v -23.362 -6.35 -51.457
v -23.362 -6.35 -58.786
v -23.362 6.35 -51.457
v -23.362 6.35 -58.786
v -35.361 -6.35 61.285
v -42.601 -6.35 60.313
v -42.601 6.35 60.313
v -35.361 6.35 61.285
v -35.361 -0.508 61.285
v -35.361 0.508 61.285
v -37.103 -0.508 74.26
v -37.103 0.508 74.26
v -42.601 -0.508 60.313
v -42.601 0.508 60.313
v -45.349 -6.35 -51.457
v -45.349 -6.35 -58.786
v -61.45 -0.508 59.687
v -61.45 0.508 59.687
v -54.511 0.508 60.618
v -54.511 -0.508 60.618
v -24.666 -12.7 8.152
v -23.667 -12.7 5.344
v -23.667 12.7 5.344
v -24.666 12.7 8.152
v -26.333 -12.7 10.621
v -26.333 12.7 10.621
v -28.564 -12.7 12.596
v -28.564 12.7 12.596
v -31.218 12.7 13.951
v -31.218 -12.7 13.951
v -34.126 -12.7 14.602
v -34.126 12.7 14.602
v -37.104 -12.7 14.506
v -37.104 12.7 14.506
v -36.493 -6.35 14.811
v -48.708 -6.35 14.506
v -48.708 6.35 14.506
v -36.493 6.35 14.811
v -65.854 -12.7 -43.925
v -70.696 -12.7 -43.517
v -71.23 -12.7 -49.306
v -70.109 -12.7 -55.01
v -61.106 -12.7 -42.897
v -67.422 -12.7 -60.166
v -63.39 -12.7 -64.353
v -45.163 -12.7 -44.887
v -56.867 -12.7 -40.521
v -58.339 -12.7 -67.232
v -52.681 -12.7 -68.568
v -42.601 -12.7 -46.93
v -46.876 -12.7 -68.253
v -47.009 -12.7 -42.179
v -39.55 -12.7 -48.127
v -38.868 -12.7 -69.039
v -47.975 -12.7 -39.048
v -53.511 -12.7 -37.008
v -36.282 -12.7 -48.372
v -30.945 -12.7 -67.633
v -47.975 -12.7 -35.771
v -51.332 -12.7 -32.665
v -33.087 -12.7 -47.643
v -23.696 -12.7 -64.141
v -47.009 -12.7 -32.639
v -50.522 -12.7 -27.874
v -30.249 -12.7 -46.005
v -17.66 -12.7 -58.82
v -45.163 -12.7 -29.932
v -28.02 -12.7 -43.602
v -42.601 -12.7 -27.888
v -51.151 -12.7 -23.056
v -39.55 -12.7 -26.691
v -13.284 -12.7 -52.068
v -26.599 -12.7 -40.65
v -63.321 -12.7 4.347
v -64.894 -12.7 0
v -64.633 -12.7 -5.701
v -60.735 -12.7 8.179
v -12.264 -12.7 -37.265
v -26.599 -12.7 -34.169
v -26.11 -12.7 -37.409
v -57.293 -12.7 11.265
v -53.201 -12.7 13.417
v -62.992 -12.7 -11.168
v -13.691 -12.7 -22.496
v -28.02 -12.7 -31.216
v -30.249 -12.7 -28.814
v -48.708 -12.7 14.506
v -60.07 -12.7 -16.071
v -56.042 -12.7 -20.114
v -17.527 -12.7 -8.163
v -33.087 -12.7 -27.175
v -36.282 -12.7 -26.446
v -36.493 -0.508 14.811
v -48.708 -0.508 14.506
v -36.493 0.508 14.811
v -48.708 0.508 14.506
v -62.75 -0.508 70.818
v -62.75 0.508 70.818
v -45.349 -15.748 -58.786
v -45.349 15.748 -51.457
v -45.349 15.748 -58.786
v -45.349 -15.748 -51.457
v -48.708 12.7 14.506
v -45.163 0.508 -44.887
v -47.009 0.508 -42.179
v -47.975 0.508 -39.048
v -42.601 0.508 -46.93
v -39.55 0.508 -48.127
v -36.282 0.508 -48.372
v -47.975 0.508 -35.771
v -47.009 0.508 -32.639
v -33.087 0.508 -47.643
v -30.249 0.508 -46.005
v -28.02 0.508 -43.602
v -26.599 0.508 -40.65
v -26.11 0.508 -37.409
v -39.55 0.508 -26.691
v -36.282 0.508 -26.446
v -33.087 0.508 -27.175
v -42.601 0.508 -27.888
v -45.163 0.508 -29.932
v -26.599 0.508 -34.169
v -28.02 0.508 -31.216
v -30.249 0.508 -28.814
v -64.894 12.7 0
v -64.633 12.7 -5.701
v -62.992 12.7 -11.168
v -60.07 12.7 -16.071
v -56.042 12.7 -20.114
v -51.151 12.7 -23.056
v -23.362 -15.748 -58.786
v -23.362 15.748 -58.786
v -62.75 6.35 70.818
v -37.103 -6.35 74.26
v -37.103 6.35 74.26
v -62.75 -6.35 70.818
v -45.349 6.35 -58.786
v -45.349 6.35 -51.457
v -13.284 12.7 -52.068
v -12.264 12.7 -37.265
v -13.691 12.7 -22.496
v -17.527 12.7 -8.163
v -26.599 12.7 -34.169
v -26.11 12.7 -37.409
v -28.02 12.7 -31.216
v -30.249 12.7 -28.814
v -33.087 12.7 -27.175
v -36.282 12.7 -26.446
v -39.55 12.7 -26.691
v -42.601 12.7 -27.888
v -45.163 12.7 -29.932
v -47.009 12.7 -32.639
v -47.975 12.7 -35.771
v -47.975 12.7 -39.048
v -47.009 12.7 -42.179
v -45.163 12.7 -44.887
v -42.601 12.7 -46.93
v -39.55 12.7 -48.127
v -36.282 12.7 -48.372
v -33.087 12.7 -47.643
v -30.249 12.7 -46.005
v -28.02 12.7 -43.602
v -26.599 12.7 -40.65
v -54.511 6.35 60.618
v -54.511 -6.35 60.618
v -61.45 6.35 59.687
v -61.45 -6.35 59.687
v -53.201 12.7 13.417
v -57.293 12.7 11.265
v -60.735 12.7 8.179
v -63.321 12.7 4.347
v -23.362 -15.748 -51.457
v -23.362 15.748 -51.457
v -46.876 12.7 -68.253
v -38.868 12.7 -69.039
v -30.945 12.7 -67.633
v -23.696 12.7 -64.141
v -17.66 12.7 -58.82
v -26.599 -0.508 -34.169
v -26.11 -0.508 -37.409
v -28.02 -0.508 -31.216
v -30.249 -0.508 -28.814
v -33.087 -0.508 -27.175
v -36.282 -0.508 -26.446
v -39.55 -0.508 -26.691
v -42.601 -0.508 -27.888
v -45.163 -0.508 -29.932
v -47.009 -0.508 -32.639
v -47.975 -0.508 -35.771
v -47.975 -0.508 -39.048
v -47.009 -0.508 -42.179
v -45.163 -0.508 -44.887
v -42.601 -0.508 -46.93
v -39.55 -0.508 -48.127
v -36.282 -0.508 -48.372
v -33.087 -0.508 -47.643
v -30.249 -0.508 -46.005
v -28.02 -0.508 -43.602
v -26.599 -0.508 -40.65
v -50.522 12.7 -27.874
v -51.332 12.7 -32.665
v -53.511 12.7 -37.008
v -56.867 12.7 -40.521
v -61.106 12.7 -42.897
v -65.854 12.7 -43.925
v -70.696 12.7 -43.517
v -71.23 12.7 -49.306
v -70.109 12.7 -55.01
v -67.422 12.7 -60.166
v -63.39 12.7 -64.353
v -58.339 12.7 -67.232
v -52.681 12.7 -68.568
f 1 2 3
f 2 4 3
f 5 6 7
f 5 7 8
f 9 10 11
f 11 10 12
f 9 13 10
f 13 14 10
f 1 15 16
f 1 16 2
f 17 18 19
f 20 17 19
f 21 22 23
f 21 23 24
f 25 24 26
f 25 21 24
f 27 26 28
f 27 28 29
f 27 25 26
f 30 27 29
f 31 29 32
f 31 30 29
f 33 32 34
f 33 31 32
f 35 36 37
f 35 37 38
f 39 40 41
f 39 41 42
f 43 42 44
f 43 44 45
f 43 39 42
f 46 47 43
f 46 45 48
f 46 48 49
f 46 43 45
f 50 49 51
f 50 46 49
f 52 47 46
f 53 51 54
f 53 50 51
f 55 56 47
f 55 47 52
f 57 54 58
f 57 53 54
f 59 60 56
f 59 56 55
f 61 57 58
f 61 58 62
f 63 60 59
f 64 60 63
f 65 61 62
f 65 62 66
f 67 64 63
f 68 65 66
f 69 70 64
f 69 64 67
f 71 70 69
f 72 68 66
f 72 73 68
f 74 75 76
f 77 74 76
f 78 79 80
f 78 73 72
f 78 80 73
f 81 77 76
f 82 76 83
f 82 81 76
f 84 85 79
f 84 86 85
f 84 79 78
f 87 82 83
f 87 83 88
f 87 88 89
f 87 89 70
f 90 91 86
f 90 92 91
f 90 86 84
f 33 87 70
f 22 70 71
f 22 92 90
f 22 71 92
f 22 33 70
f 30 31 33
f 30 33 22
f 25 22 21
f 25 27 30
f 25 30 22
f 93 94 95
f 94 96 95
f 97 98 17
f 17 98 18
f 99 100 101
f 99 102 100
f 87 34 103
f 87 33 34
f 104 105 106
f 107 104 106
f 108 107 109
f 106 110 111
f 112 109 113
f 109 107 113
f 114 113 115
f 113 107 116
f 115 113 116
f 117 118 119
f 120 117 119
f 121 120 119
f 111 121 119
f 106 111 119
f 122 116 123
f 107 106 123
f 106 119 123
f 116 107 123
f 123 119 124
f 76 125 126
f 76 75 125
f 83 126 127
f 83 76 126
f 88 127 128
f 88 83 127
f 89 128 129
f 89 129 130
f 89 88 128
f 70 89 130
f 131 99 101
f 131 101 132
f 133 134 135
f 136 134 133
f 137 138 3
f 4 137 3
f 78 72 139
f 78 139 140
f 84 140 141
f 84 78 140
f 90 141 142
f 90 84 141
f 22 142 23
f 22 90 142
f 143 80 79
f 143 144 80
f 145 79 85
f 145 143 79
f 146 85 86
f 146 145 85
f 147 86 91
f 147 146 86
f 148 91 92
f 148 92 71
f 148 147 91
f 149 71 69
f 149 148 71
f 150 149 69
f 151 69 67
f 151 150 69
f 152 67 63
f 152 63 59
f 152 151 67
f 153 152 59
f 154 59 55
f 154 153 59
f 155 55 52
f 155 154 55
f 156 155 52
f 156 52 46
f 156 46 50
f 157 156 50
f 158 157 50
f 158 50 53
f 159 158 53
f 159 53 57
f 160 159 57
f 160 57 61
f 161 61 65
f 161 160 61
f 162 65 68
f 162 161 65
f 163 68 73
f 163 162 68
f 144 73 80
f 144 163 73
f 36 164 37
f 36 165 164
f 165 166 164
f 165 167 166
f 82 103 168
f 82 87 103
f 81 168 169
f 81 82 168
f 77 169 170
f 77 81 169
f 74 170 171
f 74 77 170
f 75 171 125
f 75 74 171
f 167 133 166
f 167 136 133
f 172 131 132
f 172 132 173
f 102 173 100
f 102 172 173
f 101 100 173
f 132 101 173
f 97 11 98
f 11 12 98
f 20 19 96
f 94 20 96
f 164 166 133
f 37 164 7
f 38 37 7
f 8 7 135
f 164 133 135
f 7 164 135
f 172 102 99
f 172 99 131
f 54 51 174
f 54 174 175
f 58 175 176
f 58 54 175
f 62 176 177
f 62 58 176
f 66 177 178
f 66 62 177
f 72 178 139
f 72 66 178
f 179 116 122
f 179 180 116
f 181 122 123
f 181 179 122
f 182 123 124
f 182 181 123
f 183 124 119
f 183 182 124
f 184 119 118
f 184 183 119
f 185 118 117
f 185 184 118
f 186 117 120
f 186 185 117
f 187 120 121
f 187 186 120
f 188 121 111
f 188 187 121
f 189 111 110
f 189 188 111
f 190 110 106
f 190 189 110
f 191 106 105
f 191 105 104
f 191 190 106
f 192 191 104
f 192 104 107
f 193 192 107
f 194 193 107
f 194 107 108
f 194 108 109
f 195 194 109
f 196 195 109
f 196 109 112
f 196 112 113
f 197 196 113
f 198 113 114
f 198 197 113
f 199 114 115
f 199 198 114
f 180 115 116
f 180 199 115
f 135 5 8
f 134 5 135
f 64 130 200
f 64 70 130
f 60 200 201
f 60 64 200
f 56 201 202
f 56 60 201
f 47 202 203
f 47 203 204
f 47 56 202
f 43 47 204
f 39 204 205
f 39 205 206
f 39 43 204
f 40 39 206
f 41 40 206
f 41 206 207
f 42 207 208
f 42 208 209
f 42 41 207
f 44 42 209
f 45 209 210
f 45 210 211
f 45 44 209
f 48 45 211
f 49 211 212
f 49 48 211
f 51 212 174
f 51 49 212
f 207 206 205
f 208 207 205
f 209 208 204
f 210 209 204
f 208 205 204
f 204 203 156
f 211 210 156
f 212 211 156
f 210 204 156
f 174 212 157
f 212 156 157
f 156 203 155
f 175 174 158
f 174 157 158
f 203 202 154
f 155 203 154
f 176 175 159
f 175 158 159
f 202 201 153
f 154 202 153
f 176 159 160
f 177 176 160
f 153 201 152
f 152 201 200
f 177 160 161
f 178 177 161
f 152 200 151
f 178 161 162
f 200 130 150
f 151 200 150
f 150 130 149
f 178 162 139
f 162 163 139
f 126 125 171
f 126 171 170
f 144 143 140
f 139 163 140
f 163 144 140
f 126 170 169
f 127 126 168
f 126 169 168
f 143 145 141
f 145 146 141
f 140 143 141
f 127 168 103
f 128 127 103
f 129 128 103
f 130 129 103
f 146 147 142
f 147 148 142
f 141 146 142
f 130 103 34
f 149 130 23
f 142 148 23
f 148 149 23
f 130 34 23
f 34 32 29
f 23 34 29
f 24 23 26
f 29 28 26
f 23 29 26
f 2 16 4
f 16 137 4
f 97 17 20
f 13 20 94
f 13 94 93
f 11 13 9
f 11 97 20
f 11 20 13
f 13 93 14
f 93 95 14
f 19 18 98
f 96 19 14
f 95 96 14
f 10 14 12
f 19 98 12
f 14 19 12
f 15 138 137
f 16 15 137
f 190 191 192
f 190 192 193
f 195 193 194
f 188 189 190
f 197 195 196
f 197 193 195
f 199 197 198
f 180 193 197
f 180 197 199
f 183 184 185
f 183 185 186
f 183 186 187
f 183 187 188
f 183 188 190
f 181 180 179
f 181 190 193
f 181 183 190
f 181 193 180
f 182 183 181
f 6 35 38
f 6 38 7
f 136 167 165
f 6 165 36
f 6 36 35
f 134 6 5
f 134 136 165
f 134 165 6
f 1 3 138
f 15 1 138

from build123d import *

# Parameters (mm, degrees)
F3_DEPTH = 6.35
F0_R     = 10.99374
F4_DEPTH = 0.508
F5_DEPTH = 12.7
F6_DEPTH = 15.748


with BuildPart() as f3:
    # F2 (on Front) + F1 (on Front) → F3 (new body, symmetric)
    with BuildSketch(Plane.XZ):
        Polygon((-39.205392, -51.456813), (-45.349181, -51.456813), (-45.349181, -58.785971), (-23.3617, -58.785971), (-23.3617, -51.456813), (-30.349323, -51.456813), (-33.403141, -51.456813), (-36.456955, -51.456813), align=None)
    with BuildSketch(Plane.XZ):
        Polygon((-54.510631, 60.618263), (-48.708379, 14.505629), (-36.493111, 14.811012), (-42.600743, 60.312882), align=None)
        Polygon((-61.450365, 59.686755), (-54.510631, 60.618263), (-42.600743, 60.312882), (-35.361034, 61.284655), (-37.102713, 74.260171), (-62.749736, 70.817618), align=None)
    extrude(amount=F3_DEPTH, both=True)


with BuildPart() as f4:
    # F1 (on Front) + F0 (on Front) → F4 (new body, symmetric)
    with BuildSketch(Plane.XZ):
        Polygon((-54.510631, 60.618263), (-48.708379, 14.505629), (-36.493111, 14.811012), (-42.600743, 60.312882), align=None)
        Polygon((-61.450365, 59.686755), (-54.510631, 60.618263), (-42.600743, 60.312882), (-35.361034, 61.284655), (-37.102713, 74.260171), (-62.749736, 70.817618), align=None)
    with BuildSketch(Plane.XZ):
        with Locations((-37.103873, -37.409257)):
            Circle(F0_R)
    extrude(amount=F4_DEPTH, both=True)


with BuildPart() as f5:
    # F0 (on Front) → F5 (new body, symmetric)
    with BuildSketch(Plane.XZ):
        with BuildLine():
            ThreePointArc((-51.151432, -23.056319), (-55.057973, -38.889639), (-70.695862, -43.516893))
            ThreePointArc((-70.695862, -43.516893), (-65.556054, -62.404188), (-46.876088, -68.252809))
            ThreePointArc((-46.876088, -68.252809), (-27.201276, -66.135097), (-13.284103, -52.067574))
            ThreePointArc((-13.284103, -52.067574), (-13.691281, -22.496449), (-23.66708, 5.34418))
            ThreePointArc((-23.66708, 5.34418), (-28.56441, 12.595803), (-37.103873, 14.505629))
            Line((-37.103873, 14.505629), (-48.708379, 14.505629))
            ThreePointArc((-48.708379, 14.505629), (-59.109259, 9.828352), (-64.893611, 0))
            ThreePointArc((-64.893611, 0), (-61.681852, -13.709218), (-51.151432, -23.056319))
        make_face()
        with Locations((-37.103873, -37.409257)):
            Circle(F0_R, mode=Mode.SUBTRACT)
    extrude(amount=F5_DEPTH, both=True)


with BuildPart() as f6:
    # F2 (on Front) → F6 (new body, symmetric)
    with BuildSketch(Plane.XZ):
        Polygon((-39.205392, -51.456813), (-45.349181, -51.456813), (-45.349181, -58.785971), (-23.3617, -58.785971), (-23.3617, -51.456813), (-30.349323, -51.456813), (-33.403141, -51.456813), (-36.456955, -51.456813), align=None)
    extrude(amount=F6_DEPTH, both=True)


solid = Compound([f3.part, f4.part, f5.part, f6.part])
